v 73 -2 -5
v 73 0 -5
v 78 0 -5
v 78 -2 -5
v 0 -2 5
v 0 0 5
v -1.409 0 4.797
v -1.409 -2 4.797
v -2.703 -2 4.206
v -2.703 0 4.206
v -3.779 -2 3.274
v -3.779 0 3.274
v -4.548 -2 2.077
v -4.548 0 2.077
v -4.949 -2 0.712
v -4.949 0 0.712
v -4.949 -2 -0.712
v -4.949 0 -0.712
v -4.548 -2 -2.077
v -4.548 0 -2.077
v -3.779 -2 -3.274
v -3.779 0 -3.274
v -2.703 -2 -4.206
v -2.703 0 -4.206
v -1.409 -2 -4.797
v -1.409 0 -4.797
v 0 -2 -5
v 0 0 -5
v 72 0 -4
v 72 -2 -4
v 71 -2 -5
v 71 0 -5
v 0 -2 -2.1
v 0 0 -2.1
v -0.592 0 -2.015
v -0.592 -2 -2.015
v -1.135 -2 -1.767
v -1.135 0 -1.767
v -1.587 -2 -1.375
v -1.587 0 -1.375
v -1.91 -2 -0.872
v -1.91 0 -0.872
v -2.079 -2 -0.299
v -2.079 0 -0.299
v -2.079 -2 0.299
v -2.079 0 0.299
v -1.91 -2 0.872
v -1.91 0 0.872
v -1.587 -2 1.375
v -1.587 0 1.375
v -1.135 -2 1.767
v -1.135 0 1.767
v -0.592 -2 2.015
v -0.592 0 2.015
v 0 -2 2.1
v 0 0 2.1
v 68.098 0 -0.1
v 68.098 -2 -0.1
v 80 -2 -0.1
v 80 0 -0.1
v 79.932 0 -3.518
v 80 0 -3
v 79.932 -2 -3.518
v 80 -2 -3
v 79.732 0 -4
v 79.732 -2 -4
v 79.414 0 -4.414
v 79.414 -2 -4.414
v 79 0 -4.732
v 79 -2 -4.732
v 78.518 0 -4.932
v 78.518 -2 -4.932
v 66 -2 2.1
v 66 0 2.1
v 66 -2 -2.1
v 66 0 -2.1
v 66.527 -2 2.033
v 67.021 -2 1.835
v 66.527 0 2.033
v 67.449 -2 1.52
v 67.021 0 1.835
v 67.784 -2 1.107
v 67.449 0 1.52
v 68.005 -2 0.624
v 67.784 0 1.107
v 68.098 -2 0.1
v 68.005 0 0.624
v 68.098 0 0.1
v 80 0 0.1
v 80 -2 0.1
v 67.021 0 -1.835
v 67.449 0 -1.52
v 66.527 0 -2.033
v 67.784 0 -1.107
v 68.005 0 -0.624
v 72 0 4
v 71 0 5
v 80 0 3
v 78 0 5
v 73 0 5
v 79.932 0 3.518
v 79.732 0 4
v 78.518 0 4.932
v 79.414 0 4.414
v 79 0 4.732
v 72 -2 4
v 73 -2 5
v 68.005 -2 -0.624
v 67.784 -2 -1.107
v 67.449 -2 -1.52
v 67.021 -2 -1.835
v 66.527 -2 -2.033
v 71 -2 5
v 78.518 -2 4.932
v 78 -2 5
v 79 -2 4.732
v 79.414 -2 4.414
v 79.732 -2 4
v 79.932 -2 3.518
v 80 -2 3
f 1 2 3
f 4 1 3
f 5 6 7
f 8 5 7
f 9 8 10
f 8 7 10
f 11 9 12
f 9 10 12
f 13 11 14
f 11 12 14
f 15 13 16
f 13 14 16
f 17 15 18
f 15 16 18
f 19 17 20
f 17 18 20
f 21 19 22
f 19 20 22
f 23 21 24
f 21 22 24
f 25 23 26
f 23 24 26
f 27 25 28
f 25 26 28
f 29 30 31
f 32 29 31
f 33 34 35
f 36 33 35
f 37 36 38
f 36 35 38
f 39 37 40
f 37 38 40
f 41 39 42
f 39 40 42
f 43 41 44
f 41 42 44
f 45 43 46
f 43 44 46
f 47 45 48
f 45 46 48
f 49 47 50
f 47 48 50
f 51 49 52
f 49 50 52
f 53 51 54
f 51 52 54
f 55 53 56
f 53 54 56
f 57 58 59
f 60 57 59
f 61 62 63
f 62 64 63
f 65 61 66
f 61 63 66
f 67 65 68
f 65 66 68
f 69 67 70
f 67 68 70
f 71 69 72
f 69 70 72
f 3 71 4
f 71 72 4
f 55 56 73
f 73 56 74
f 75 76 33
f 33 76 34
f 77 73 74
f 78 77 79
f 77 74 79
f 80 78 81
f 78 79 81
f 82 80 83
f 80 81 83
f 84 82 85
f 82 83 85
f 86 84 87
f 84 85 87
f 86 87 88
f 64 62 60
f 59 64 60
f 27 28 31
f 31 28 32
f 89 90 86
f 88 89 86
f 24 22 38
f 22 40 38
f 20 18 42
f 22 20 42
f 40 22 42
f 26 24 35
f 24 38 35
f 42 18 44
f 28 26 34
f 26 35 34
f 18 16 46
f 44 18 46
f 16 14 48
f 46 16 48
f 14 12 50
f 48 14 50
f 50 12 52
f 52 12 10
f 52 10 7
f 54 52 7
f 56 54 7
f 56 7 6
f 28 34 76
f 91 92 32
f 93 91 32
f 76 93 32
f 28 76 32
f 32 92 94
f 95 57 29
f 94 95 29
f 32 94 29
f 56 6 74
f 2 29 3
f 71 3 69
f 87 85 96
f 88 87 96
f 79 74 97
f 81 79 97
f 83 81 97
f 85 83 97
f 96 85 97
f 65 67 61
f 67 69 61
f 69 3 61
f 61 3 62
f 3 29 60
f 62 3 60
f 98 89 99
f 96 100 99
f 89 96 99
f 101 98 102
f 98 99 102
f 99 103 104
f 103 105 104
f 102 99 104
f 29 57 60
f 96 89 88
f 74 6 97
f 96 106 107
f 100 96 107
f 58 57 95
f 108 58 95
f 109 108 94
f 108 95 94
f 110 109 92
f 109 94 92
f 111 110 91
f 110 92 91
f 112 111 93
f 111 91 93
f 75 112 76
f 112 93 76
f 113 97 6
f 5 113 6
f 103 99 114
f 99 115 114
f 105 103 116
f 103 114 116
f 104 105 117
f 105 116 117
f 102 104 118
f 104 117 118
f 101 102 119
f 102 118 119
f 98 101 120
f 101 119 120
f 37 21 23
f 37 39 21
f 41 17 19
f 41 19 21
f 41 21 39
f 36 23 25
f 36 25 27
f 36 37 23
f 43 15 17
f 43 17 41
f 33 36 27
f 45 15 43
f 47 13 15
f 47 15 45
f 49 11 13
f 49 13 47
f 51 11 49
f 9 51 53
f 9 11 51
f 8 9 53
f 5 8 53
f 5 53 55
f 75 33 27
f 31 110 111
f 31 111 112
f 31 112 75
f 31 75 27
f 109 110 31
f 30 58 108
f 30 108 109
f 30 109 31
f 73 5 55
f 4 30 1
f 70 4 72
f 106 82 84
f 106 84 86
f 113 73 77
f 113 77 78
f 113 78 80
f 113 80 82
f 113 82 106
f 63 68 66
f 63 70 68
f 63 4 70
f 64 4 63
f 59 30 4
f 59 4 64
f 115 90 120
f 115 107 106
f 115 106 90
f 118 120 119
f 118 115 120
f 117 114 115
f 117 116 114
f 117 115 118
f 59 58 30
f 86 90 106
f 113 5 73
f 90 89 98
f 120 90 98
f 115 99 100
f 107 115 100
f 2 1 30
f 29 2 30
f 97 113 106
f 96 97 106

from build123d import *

# Parameters (mm, degrees)
F1_DEPTH = 2
F3_DEPTH = 2.001
F4_R     = 2
F6_DEPTH = 2.001


with BuildPart() as f1:
    # F0 (on Front) → F1 (new body)
    with BuildSketch(Plane.XZ):
        with BuildLine():
            Line((80, 5), (0, 5))
            ThreePointArc((0, 5), (-5, 0), (0, -5))
            Line((0, -5), (80, -5))
            Line((80, -5), (80, 5))
        make_face()
        with BuildLine():
            Line((66, -2.1), (0, -2.1))
            ThreePointArc((0, -2.1), (-2.1, 0), (0, 2.1))
            Line((0, 2.1), (66, 2.1))
            ThreePointArc((66, 2.1), (68.1, 0), (66, -2.1))
        make_face(mode=Mode.SUBTRACT)
    extrude(amount=F1_DEPTH)

    # F2 (on face) → F3 (cut, through all)
    with BuildSketch(Plane.XZ.offset(2)):
        Polygon((73, 5), (71, 5), (72, 4), align=None)
        Polygon((73, -5), (72, -4), (71, -5), align=None)
    extrude(amount=-F3_DEPTH, mode=Mode.SUBTRACT)

    # F4
    f4_edges = [f1.edges().sort_by_distance(p)[0] for p in [
        (80, -1, 5),
        (80, -1, -5),
    ]]
    fillet(f4_edges, radius=F4_R)

    # F5 (on face) → F6 (cut, through all)
    with BuildSketch(Plane.XZ.offset(2)):
        with BuildLine():
            Line((80, -0.1), (80, 0.1))
            Line((80, 0.1), (68.0976176963, 0.1))
            ThreePointArc((68.0976176963, 0.1), (68.1, 0), (68.0976176963, -0.1))
            Line((68.0976176963, -0.1), (80, -0.1))
        make_face()
    extrude(amount=-F6_DEPTH, mode=Mode.SUBTRACT)


solid = f1.part
